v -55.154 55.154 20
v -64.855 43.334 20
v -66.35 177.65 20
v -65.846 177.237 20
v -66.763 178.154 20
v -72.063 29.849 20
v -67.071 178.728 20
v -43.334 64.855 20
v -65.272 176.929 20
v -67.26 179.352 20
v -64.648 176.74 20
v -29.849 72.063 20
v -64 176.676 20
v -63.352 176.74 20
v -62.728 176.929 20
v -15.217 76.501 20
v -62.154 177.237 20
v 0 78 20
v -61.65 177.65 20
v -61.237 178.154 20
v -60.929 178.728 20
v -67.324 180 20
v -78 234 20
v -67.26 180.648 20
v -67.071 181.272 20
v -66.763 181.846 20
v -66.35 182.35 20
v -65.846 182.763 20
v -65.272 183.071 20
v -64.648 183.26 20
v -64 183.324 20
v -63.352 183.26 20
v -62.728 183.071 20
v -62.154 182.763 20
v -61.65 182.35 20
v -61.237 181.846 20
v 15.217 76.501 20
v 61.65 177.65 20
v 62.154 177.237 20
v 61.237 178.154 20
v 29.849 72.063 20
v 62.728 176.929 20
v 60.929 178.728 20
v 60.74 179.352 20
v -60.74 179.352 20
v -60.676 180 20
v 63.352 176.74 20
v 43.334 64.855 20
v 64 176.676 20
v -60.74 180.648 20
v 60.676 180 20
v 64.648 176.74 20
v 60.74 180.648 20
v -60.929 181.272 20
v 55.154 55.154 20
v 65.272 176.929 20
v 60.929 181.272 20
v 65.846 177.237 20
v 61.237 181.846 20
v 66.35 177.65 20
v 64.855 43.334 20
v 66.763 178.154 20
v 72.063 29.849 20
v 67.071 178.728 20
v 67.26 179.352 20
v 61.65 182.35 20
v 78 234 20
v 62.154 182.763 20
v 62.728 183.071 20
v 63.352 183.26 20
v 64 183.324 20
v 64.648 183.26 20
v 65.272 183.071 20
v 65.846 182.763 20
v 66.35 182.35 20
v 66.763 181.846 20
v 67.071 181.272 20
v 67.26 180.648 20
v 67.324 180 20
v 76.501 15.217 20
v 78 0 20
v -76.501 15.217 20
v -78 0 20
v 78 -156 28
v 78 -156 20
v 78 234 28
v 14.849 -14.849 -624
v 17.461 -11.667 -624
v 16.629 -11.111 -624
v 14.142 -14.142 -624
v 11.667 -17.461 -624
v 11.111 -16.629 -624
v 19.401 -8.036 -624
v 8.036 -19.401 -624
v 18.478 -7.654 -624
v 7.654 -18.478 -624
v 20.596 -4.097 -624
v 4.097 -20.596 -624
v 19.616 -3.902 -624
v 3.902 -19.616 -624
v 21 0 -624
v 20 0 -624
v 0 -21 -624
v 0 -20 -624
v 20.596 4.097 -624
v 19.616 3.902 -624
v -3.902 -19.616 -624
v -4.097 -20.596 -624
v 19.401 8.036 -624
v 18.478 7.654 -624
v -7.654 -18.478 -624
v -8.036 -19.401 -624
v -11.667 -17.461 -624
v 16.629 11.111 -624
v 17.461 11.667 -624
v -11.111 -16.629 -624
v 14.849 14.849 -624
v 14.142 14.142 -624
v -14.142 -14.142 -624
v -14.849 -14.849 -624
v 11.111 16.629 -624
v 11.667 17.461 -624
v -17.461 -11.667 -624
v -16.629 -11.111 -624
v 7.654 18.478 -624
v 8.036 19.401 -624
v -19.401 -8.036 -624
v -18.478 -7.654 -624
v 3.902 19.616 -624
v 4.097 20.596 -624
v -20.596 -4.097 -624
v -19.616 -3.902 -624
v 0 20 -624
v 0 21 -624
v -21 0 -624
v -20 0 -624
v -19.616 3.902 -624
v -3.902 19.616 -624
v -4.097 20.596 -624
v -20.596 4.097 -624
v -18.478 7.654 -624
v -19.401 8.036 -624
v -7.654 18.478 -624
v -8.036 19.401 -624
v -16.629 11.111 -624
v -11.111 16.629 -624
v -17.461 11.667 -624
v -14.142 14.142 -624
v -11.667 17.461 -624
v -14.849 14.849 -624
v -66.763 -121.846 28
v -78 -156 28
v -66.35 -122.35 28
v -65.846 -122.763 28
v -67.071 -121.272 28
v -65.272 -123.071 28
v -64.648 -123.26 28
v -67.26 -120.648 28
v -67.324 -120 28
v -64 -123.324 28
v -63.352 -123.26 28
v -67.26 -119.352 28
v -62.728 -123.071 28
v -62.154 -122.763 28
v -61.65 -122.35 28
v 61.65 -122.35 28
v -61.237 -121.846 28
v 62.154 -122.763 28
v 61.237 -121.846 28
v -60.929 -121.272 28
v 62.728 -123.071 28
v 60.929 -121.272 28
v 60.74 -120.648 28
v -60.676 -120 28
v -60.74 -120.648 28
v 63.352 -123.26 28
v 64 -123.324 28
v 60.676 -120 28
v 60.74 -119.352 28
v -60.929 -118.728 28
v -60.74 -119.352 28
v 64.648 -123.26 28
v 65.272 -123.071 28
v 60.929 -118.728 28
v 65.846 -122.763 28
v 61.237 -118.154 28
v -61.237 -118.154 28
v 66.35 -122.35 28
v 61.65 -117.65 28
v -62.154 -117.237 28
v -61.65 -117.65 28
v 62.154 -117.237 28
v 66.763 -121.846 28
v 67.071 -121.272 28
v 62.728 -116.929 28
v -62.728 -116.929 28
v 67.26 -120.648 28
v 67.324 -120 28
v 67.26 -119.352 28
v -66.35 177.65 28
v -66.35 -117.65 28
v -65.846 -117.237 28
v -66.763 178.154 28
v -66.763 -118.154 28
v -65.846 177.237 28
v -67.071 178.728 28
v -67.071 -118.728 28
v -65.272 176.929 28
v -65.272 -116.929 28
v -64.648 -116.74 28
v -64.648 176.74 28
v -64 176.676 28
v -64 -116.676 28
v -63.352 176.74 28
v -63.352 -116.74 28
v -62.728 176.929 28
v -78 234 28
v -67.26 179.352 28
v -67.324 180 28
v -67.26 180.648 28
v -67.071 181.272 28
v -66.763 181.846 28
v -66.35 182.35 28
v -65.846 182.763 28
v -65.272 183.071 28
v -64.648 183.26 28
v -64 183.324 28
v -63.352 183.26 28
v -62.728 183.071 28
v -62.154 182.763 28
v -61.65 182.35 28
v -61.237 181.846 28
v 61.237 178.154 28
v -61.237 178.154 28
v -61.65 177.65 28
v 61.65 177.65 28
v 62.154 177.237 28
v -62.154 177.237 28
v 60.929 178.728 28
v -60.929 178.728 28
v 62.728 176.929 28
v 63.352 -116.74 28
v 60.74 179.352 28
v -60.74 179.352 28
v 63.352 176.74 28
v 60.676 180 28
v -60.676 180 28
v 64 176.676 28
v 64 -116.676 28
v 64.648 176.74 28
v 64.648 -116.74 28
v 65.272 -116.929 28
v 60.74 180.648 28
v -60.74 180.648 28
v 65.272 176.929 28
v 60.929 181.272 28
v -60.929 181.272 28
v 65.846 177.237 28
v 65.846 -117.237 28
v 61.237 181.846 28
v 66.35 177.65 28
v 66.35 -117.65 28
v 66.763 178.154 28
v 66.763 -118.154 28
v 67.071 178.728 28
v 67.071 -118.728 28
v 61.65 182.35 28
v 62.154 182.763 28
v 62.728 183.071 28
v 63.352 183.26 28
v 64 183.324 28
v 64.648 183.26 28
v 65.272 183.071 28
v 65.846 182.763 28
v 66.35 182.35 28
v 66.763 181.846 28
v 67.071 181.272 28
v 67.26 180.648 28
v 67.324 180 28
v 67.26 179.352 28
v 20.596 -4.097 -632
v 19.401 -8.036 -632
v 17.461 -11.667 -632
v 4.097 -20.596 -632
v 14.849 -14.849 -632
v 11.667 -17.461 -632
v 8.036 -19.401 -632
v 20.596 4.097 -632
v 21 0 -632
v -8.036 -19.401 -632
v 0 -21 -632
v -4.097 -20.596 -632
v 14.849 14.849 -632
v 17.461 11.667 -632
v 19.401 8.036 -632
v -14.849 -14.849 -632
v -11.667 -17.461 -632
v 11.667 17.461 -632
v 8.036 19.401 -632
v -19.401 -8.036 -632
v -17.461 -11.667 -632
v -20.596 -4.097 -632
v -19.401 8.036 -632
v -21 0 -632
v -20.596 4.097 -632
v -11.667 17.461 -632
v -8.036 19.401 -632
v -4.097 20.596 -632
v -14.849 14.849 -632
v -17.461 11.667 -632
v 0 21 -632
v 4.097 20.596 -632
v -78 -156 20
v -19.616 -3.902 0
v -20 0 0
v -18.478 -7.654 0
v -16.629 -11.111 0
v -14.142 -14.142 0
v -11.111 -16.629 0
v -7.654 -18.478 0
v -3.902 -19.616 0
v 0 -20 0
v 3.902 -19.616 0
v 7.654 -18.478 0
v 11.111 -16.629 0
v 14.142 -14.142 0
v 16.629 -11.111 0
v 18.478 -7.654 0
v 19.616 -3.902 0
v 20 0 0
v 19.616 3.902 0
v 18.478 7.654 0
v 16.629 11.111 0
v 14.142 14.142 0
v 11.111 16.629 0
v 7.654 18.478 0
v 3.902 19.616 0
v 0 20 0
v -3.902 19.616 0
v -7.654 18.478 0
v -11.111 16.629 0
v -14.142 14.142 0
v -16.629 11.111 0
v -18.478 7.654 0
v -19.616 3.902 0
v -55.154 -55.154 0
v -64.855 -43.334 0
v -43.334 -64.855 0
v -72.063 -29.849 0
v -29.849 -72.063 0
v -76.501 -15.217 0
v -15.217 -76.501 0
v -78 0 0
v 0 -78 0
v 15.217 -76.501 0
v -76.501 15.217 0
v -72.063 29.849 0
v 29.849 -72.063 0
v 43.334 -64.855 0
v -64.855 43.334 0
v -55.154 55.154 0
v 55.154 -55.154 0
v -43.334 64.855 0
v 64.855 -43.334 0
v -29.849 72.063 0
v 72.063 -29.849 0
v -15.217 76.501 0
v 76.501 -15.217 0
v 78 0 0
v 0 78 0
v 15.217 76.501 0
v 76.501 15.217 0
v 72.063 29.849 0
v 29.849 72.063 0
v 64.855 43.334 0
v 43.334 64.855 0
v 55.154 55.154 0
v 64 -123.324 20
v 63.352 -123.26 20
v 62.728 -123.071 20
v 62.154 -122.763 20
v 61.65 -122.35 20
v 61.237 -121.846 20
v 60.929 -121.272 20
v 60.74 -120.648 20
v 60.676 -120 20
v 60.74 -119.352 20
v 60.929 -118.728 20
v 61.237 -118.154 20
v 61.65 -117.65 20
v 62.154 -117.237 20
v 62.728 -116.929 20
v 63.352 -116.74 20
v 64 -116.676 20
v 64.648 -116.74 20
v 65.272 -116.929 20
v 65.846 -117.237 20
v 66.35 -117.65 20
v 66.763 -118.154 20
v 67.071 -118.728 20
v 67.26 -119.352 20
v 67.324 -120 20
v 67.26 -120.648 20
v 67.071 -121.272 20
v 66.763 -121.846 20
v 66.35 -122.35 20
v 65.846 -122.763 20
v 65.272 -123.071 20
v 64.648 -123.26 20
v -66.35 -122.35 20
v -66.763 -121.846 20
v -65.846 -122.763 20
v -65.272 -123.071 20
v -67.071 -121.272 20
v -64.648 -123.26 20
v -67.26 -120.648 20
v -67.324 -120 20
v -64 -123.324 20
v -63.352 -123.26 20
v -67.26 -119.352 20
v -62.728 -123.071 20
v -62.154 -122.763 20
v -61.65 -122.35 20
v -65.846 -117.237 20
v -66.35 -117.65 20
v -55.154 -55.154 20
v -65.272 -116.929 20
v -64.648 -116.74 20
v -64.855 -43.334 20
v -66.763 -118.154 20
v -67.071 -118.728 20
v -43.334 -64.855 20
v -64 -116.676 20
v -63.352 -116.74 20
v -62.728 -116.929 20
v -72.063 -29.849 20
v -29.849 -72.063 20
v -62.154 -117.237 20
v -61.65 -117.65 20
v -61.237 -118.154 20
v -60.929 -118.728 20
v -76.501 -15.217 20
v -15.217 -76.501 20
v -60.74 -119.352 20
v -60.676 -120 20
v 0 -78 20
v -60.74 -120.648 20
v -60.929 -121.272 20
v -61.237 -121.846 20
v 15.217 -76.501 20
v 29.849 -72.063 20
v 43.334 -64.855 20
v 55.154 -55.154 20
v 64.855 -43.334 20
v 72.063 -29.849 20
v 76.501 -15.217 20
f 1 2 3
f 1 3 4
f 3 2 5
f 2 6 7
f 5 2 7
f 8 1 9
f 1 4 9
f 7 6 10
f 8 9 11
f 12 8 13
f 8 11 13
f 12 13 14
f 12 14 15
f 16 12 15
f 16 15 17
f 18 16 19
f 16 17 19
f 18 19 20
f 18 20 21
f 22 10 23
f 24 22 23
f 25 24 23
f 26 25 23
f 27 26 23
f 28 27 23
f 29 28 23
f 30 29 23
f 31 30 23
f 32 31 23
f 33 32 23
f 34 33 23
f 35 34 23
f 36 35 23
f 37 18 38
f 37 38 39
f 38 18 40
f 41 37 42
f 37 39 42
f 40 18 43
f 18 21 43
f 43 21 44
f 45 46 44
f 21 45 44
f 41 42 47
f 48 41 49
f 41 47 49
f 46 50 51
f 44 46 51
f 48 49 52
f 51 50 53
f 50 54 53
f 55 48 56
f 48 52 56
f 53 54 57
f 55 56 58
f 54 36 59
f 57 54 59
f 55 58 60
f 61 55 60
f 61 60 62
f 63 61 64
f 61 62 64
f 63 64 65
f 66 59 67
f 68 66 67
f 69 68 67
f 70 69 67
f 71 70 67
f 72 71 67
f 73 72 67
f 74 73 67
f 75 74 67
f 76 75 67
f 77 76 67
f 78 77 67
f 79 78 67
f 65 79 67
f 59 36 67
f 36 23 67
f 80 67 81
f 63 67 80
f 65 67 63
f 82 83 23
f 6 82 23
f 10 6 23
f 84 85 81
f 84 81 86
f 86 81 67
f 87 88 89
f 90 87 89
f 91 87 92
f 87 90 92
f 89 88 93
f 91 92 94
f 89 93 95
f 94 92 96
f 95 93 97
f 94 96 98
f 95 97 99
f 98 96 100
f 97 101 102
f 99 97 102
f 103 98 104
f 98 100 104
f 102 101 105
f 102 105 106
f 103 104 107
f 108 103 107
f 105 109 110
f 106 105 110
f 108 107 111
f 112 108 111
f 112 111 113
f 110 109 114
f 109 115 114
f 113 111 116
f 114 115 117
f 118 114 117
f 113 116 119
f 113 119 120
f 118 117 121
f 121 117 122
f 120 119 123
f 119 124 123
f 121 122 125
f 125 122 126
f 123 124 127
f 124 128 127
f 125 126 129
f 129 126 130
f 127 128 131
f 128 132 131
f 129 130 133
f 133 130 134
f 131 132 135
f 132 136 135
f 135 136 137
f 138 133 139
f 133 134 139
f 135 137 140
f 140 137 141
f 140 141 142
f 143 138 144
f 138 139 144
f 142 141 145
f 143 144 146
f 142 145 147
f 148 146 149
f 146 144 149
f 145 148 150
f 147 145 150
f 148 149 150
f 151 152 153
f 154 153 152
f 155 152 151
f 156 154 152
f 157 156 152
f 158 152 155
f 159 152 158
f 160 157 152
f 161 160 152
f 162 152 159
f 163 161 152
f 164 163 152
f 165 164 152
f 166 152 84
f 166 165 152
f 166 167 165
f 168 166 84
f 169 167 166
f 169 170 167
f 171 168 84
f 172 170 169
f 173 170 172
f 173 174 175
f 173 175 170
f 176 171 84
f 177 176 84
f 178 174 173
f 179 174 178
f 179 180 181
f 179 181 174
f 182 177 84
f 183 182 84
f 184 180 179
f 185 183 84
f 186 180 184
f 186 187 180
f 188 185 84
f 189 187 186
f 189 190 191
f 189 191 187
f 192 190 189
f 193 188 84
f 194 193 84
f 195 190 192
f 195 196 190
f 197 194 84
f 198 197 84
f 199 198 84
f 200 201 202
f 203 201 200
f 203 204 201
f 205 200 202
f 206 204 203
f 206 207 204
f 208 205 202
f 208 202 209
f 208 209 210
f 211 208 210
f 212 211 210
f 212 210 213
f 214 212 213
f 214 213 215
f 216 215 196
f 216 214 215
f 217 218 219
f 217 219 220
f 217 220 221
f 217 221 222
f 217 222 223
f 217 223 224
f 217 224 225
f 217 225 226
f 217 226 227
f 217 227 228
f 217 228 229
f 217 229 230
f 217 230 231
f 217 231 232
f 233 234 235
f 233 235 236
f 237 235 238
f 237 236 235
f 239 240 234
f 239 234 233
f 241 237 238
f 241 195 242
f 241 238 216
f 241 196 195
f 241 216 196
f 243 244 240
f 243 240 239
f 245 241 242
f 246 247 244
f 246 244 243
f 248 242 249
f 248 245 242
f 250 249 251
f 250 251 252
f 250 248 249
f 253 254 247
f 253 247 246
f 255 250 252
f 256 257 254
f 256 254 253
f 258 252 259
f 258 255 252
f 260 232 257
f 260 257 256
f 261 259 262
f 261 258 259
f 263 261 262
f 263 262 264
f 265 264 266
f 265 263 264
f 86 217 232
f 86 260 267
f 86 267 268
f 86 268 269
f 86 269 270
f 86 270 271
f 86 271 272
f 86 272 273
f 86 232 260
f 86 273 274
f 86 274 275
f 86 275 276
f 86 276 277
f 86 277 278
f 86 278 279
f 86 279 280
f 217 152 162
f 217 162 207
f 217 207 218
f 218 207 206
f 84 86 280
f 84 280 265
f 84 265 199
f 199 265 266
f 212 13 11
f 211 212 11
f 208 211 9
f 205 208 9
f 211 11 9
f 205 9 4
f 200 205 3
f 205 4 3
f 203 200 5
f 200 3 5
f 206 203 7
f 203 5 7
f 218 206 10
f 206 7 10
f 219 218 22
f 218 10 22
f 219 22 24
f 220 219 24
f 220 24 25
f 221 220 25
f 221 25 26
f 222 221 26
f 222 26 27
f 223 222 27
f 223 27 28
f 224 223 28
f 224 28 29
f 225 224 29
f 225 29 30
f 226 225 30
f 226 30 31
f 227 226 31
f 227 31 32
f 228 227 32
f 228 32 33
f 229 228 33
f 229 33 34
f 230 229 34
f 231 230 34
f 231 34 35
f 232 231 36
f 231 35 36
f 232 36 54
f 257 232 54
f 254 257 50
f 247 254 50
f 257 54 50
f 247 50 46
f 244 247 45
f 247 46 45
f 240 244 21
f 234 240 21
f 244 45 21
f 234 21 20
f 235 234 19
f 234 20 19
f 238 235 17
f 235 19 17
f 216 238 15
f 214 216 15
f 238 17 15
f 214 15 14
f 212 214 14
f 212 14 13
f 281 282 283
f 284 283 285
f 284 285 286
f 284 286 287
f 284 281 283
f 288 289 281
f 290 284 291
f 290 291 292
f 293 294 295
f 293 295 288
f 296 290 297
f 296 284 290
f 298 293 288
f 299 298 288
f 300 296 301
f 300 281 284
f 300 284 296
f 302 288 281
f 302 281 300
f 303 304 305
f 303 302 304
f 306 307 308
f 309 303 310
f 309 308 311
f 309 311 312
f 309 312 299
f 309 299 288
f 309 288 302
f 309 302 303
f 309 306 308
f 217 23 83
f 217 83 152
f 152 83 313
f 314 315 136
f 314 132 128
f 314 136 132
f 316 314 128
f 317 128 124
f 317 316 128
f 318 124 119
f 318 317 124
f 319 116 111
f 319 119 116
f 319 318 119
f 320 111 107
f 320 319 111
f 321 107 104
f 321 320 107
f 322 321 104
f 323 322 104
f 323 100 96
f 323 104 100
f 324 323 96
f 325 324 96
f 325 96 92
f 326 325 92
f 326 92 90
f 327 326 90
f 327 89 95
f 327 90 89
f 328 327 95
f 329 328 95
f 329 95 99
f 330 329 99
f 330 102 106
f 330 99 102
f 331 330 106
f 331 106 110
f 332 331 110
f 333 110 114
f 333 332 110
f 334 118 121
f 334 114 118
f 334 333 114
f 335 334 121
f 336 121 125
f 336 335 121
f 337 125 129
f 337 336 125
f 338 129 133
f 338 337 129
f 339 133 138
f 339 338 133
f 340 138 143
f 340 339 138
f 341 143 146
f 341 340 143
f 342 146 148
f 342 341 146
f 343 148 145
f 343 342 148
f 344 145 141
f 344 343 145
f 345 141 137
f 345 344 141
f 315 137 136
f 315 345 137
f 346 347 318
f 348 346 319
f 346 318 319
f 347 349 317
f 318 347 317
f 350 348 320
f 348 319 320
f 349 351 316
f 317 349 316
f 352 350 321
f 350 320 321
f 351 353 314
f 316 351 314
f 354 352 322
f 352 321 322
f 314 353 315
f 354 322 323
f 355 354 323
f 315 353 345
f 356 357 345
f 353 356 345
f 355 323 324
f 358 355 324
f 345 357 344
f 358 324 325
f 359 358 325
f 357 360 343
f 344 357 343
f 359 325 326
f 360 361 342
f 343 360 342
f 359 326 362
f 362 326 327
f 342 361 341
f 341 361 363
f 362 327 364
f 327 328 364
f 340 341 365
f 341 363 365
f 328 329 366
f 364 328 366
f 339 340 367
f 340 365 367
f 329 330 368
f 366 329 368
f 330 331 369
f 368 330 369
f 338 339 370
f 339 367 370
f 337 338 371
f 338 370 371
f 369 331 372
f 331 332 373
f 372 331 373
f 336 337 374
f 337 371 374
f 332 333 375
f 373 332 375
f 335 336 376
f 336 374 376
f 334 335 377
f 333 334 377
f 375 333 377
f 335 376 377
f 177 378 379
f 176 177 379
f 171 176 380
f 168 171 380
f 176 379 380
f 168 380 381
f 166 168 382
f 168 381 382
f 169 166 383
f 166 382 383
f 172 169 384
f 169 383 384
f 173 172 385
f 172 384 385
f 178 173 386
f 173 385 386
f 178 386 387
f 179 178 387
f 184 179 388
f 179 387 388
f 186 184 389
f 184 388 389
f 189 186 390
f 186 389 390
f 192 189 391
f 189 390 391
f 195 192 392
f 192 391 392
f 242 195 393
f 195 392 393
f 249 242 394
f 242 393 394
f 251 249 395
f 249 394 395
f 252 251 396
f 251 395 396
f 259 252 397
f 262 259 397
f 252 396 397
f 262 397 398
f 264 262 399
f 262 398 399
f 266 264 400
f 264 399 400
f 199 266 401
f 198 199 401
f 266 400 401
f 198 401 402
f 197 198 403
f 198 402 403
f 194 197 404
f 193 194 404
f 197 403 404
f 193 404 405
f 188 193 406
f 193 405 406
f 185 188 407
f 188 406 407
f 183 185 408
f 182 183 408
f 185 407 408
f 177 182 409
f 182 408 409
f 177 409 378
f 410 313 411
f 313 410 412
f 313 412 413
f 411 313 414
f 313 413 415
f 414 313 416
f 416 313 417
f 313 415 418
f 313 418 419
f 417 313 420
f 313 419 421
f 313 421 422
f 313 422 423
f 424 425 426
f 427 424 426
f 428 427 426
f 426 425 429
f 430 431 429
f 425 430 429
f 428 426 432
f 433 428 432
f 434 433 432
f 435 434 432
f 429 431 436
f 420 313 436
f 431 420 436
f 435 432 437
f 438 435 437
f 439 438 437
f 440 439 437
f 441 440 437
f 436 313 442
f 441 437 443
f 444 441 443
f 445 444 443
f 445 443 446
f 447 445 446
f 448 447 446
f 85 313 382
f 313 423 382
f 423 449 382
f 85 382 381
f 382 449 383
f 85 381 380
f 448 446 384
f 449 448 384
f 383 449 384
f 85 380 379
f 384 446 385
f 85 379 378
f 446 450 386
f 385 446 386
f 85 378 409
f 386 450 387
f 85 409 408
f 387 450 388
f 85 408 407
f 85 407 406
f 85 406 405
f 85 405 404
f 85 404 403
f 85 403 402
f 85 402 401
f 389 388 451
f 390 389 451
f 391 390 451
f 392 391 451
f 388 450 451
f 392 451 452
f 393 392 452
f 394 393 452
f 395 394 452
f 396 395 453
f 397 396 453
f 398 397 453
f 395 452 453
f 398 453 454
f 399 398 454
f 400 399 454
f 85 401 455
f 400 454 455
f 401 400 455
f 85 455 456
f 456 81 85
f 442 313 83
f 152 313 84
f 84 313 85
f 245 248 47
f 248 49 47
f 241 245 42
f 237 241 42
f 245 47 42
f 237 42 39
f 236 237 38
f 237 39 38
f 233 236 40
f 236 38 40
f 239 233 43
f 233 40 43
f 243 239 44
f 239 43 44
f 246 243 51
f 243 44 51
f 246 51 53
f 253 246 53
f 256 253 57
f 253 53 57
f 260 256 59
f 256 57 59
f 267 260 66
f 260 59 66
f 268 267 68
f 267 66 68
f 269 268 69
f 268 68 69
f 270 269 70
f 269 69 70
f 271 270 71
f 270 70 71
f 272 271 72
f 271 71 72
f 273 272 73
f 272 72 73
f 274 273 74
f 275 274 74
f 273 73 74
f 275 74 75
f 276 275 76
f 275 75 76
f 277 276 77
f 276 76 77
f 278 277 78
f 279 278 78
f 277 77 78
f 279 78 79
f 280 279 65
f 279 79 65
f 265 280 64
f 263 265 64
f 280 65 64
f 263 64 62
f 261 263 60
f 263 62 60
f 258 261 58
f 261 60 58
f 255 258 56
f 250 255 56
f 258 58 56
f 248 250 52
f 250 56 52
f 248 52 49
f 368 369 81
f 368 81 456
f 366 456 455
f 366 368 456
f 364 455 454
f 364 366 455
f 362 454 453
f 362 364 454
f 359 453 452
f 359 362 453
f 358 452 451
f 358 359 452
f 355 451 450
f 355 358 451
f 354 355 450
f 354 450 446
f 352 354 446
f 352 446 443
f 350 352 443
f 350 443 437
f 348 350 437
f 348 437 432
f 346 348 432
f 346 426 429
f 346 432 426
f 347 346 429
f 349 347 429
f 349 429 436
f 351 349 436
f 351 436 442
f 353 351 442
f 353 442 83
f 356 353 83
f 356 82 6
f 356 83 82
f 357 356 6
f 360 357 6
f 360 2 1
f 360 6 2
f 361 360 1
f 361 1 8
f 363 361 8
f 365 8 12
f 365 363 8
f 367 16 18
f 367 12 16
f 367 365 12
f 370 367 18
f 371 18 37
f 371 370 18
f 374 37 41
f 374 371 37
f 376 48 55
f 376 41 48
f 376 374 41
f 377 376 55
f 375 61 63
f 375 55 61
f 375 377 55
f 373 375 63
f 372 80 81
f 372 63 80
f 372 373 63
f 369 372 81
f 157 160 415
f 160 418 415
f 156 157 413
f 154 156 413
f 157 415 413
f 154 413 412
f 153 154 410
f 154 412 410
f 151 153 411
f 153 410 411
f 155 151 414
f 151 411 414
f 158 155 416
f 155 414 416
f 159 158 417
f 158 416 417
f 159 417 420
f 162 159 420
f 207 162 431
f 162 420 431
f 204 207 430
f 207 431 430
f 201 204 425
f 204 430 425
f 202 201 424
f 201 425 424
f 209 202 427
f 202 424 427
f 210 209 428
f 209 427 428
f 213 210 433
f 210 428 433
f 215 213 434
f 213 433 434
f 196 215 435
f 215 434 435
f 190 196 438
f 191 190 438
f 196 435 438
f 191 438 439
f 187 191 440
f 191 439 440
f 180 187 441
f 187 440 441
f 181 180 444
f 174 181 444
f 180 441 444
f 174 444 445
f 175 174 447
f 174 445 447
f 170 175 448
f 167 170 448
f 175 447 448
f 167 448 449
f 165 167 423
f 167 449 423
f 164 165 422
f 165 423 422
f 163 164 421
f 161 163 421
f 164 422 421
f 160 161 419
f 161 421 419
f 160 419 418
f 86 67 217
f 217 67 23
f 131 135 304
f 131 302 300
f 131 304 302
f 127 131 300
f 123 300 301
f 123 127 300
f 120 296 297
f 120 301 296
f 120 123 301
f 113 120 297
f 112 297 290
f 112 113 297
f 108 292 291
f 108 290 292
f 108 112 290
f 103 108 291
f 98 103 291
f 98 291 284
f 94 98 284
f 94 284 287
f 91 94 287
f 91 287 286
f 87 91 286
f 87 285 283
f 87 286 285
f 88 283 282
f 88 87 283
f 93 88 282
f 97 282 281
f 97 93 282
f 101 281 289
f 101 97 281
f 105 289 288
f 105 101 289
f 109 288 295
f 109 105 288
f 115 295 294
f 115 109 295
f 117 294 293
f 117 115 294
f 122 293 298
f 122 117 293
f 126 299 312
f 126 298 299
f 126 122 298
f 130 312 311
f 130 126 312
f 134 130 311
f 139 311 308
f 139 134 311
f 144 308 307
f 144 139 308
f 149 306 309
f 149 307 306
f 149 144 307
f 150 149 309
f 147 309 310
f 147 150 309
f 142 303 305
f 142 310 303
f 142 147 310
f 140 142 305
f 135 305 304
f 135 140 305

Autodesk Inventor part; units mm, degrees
ref_plane "YZ Plane" through (0, 0, 0) normal (1, 0, 0) x (0, 1, 0)
ref_plane "XZ Plane" through (0, 0, 0) normal (0, 1, 0) x (-1, 0, 0)
ref_plane "XY Plane" through (0, 0, 0) normal (0, 0, 1) x (1, 0, 0)
sketch "Sketch1" plane through (0, 0, 0) normal (0, 0, 1) x (1, 0, 0)
  circle A0 centre (0, 0) radius 78
extrude "Connector" add sketch "Sketch1" along normal blind 20
sketch "Sketch2" plane through (0, 0, 0) normal (0, 0, -1) x (-1, 0, 0)
  circle A0 centre (0, 0) radius 20
extrude "RotAxis" add sketch "Sketch2" along normal blind 624
sketch "Sketch3" plane through (0, 0, 20) normal (0, 0, 1) x (1, 0, 0)
  line L0 (78, 234) -> (-78, 234)
  line L1 (-78, 234) -> (-78, -156)
  line L2 (-78, -156) -> (78, -156)
  line L3 (78, -156) -> (78, 234)
  point P0 (0, 0)
extrude "TelescopeMount" add sketch "Sketch3" along normal blind 8
sketch "Sketch4" plane through (0, 0, -624) normal (0, 0, -1) x (-1, 0, 0)
  circle A0 centre (0, 0) radius 21
extrude "Cap" add sketch "Sketch4" along normal blind 8
sketch "Sketch5" plane through (0, 0, 28) normal (0, 0, 1) x (1, 0, 0)
  line L0 (-78, 234) -> (-78, -156) projected
  line L1 (78, -156) -> (78, 234) projected
  point P0 (0, 0)
  point P1 (64, -120)
  point P2 (-64, -120)
  point P3 (-64, 180)
  point P4 (64, 180)
hole "Hole1" at (64, -120, 28) at (-64, -120, 28) at (-64, 180, 28) at (64, 180, 28) direction (0, 0, -1) diameter 6.647 end through all thread size "M8x1.25" class "6H" standard "ISO Metric profile"
properties part number "DecAxis"
